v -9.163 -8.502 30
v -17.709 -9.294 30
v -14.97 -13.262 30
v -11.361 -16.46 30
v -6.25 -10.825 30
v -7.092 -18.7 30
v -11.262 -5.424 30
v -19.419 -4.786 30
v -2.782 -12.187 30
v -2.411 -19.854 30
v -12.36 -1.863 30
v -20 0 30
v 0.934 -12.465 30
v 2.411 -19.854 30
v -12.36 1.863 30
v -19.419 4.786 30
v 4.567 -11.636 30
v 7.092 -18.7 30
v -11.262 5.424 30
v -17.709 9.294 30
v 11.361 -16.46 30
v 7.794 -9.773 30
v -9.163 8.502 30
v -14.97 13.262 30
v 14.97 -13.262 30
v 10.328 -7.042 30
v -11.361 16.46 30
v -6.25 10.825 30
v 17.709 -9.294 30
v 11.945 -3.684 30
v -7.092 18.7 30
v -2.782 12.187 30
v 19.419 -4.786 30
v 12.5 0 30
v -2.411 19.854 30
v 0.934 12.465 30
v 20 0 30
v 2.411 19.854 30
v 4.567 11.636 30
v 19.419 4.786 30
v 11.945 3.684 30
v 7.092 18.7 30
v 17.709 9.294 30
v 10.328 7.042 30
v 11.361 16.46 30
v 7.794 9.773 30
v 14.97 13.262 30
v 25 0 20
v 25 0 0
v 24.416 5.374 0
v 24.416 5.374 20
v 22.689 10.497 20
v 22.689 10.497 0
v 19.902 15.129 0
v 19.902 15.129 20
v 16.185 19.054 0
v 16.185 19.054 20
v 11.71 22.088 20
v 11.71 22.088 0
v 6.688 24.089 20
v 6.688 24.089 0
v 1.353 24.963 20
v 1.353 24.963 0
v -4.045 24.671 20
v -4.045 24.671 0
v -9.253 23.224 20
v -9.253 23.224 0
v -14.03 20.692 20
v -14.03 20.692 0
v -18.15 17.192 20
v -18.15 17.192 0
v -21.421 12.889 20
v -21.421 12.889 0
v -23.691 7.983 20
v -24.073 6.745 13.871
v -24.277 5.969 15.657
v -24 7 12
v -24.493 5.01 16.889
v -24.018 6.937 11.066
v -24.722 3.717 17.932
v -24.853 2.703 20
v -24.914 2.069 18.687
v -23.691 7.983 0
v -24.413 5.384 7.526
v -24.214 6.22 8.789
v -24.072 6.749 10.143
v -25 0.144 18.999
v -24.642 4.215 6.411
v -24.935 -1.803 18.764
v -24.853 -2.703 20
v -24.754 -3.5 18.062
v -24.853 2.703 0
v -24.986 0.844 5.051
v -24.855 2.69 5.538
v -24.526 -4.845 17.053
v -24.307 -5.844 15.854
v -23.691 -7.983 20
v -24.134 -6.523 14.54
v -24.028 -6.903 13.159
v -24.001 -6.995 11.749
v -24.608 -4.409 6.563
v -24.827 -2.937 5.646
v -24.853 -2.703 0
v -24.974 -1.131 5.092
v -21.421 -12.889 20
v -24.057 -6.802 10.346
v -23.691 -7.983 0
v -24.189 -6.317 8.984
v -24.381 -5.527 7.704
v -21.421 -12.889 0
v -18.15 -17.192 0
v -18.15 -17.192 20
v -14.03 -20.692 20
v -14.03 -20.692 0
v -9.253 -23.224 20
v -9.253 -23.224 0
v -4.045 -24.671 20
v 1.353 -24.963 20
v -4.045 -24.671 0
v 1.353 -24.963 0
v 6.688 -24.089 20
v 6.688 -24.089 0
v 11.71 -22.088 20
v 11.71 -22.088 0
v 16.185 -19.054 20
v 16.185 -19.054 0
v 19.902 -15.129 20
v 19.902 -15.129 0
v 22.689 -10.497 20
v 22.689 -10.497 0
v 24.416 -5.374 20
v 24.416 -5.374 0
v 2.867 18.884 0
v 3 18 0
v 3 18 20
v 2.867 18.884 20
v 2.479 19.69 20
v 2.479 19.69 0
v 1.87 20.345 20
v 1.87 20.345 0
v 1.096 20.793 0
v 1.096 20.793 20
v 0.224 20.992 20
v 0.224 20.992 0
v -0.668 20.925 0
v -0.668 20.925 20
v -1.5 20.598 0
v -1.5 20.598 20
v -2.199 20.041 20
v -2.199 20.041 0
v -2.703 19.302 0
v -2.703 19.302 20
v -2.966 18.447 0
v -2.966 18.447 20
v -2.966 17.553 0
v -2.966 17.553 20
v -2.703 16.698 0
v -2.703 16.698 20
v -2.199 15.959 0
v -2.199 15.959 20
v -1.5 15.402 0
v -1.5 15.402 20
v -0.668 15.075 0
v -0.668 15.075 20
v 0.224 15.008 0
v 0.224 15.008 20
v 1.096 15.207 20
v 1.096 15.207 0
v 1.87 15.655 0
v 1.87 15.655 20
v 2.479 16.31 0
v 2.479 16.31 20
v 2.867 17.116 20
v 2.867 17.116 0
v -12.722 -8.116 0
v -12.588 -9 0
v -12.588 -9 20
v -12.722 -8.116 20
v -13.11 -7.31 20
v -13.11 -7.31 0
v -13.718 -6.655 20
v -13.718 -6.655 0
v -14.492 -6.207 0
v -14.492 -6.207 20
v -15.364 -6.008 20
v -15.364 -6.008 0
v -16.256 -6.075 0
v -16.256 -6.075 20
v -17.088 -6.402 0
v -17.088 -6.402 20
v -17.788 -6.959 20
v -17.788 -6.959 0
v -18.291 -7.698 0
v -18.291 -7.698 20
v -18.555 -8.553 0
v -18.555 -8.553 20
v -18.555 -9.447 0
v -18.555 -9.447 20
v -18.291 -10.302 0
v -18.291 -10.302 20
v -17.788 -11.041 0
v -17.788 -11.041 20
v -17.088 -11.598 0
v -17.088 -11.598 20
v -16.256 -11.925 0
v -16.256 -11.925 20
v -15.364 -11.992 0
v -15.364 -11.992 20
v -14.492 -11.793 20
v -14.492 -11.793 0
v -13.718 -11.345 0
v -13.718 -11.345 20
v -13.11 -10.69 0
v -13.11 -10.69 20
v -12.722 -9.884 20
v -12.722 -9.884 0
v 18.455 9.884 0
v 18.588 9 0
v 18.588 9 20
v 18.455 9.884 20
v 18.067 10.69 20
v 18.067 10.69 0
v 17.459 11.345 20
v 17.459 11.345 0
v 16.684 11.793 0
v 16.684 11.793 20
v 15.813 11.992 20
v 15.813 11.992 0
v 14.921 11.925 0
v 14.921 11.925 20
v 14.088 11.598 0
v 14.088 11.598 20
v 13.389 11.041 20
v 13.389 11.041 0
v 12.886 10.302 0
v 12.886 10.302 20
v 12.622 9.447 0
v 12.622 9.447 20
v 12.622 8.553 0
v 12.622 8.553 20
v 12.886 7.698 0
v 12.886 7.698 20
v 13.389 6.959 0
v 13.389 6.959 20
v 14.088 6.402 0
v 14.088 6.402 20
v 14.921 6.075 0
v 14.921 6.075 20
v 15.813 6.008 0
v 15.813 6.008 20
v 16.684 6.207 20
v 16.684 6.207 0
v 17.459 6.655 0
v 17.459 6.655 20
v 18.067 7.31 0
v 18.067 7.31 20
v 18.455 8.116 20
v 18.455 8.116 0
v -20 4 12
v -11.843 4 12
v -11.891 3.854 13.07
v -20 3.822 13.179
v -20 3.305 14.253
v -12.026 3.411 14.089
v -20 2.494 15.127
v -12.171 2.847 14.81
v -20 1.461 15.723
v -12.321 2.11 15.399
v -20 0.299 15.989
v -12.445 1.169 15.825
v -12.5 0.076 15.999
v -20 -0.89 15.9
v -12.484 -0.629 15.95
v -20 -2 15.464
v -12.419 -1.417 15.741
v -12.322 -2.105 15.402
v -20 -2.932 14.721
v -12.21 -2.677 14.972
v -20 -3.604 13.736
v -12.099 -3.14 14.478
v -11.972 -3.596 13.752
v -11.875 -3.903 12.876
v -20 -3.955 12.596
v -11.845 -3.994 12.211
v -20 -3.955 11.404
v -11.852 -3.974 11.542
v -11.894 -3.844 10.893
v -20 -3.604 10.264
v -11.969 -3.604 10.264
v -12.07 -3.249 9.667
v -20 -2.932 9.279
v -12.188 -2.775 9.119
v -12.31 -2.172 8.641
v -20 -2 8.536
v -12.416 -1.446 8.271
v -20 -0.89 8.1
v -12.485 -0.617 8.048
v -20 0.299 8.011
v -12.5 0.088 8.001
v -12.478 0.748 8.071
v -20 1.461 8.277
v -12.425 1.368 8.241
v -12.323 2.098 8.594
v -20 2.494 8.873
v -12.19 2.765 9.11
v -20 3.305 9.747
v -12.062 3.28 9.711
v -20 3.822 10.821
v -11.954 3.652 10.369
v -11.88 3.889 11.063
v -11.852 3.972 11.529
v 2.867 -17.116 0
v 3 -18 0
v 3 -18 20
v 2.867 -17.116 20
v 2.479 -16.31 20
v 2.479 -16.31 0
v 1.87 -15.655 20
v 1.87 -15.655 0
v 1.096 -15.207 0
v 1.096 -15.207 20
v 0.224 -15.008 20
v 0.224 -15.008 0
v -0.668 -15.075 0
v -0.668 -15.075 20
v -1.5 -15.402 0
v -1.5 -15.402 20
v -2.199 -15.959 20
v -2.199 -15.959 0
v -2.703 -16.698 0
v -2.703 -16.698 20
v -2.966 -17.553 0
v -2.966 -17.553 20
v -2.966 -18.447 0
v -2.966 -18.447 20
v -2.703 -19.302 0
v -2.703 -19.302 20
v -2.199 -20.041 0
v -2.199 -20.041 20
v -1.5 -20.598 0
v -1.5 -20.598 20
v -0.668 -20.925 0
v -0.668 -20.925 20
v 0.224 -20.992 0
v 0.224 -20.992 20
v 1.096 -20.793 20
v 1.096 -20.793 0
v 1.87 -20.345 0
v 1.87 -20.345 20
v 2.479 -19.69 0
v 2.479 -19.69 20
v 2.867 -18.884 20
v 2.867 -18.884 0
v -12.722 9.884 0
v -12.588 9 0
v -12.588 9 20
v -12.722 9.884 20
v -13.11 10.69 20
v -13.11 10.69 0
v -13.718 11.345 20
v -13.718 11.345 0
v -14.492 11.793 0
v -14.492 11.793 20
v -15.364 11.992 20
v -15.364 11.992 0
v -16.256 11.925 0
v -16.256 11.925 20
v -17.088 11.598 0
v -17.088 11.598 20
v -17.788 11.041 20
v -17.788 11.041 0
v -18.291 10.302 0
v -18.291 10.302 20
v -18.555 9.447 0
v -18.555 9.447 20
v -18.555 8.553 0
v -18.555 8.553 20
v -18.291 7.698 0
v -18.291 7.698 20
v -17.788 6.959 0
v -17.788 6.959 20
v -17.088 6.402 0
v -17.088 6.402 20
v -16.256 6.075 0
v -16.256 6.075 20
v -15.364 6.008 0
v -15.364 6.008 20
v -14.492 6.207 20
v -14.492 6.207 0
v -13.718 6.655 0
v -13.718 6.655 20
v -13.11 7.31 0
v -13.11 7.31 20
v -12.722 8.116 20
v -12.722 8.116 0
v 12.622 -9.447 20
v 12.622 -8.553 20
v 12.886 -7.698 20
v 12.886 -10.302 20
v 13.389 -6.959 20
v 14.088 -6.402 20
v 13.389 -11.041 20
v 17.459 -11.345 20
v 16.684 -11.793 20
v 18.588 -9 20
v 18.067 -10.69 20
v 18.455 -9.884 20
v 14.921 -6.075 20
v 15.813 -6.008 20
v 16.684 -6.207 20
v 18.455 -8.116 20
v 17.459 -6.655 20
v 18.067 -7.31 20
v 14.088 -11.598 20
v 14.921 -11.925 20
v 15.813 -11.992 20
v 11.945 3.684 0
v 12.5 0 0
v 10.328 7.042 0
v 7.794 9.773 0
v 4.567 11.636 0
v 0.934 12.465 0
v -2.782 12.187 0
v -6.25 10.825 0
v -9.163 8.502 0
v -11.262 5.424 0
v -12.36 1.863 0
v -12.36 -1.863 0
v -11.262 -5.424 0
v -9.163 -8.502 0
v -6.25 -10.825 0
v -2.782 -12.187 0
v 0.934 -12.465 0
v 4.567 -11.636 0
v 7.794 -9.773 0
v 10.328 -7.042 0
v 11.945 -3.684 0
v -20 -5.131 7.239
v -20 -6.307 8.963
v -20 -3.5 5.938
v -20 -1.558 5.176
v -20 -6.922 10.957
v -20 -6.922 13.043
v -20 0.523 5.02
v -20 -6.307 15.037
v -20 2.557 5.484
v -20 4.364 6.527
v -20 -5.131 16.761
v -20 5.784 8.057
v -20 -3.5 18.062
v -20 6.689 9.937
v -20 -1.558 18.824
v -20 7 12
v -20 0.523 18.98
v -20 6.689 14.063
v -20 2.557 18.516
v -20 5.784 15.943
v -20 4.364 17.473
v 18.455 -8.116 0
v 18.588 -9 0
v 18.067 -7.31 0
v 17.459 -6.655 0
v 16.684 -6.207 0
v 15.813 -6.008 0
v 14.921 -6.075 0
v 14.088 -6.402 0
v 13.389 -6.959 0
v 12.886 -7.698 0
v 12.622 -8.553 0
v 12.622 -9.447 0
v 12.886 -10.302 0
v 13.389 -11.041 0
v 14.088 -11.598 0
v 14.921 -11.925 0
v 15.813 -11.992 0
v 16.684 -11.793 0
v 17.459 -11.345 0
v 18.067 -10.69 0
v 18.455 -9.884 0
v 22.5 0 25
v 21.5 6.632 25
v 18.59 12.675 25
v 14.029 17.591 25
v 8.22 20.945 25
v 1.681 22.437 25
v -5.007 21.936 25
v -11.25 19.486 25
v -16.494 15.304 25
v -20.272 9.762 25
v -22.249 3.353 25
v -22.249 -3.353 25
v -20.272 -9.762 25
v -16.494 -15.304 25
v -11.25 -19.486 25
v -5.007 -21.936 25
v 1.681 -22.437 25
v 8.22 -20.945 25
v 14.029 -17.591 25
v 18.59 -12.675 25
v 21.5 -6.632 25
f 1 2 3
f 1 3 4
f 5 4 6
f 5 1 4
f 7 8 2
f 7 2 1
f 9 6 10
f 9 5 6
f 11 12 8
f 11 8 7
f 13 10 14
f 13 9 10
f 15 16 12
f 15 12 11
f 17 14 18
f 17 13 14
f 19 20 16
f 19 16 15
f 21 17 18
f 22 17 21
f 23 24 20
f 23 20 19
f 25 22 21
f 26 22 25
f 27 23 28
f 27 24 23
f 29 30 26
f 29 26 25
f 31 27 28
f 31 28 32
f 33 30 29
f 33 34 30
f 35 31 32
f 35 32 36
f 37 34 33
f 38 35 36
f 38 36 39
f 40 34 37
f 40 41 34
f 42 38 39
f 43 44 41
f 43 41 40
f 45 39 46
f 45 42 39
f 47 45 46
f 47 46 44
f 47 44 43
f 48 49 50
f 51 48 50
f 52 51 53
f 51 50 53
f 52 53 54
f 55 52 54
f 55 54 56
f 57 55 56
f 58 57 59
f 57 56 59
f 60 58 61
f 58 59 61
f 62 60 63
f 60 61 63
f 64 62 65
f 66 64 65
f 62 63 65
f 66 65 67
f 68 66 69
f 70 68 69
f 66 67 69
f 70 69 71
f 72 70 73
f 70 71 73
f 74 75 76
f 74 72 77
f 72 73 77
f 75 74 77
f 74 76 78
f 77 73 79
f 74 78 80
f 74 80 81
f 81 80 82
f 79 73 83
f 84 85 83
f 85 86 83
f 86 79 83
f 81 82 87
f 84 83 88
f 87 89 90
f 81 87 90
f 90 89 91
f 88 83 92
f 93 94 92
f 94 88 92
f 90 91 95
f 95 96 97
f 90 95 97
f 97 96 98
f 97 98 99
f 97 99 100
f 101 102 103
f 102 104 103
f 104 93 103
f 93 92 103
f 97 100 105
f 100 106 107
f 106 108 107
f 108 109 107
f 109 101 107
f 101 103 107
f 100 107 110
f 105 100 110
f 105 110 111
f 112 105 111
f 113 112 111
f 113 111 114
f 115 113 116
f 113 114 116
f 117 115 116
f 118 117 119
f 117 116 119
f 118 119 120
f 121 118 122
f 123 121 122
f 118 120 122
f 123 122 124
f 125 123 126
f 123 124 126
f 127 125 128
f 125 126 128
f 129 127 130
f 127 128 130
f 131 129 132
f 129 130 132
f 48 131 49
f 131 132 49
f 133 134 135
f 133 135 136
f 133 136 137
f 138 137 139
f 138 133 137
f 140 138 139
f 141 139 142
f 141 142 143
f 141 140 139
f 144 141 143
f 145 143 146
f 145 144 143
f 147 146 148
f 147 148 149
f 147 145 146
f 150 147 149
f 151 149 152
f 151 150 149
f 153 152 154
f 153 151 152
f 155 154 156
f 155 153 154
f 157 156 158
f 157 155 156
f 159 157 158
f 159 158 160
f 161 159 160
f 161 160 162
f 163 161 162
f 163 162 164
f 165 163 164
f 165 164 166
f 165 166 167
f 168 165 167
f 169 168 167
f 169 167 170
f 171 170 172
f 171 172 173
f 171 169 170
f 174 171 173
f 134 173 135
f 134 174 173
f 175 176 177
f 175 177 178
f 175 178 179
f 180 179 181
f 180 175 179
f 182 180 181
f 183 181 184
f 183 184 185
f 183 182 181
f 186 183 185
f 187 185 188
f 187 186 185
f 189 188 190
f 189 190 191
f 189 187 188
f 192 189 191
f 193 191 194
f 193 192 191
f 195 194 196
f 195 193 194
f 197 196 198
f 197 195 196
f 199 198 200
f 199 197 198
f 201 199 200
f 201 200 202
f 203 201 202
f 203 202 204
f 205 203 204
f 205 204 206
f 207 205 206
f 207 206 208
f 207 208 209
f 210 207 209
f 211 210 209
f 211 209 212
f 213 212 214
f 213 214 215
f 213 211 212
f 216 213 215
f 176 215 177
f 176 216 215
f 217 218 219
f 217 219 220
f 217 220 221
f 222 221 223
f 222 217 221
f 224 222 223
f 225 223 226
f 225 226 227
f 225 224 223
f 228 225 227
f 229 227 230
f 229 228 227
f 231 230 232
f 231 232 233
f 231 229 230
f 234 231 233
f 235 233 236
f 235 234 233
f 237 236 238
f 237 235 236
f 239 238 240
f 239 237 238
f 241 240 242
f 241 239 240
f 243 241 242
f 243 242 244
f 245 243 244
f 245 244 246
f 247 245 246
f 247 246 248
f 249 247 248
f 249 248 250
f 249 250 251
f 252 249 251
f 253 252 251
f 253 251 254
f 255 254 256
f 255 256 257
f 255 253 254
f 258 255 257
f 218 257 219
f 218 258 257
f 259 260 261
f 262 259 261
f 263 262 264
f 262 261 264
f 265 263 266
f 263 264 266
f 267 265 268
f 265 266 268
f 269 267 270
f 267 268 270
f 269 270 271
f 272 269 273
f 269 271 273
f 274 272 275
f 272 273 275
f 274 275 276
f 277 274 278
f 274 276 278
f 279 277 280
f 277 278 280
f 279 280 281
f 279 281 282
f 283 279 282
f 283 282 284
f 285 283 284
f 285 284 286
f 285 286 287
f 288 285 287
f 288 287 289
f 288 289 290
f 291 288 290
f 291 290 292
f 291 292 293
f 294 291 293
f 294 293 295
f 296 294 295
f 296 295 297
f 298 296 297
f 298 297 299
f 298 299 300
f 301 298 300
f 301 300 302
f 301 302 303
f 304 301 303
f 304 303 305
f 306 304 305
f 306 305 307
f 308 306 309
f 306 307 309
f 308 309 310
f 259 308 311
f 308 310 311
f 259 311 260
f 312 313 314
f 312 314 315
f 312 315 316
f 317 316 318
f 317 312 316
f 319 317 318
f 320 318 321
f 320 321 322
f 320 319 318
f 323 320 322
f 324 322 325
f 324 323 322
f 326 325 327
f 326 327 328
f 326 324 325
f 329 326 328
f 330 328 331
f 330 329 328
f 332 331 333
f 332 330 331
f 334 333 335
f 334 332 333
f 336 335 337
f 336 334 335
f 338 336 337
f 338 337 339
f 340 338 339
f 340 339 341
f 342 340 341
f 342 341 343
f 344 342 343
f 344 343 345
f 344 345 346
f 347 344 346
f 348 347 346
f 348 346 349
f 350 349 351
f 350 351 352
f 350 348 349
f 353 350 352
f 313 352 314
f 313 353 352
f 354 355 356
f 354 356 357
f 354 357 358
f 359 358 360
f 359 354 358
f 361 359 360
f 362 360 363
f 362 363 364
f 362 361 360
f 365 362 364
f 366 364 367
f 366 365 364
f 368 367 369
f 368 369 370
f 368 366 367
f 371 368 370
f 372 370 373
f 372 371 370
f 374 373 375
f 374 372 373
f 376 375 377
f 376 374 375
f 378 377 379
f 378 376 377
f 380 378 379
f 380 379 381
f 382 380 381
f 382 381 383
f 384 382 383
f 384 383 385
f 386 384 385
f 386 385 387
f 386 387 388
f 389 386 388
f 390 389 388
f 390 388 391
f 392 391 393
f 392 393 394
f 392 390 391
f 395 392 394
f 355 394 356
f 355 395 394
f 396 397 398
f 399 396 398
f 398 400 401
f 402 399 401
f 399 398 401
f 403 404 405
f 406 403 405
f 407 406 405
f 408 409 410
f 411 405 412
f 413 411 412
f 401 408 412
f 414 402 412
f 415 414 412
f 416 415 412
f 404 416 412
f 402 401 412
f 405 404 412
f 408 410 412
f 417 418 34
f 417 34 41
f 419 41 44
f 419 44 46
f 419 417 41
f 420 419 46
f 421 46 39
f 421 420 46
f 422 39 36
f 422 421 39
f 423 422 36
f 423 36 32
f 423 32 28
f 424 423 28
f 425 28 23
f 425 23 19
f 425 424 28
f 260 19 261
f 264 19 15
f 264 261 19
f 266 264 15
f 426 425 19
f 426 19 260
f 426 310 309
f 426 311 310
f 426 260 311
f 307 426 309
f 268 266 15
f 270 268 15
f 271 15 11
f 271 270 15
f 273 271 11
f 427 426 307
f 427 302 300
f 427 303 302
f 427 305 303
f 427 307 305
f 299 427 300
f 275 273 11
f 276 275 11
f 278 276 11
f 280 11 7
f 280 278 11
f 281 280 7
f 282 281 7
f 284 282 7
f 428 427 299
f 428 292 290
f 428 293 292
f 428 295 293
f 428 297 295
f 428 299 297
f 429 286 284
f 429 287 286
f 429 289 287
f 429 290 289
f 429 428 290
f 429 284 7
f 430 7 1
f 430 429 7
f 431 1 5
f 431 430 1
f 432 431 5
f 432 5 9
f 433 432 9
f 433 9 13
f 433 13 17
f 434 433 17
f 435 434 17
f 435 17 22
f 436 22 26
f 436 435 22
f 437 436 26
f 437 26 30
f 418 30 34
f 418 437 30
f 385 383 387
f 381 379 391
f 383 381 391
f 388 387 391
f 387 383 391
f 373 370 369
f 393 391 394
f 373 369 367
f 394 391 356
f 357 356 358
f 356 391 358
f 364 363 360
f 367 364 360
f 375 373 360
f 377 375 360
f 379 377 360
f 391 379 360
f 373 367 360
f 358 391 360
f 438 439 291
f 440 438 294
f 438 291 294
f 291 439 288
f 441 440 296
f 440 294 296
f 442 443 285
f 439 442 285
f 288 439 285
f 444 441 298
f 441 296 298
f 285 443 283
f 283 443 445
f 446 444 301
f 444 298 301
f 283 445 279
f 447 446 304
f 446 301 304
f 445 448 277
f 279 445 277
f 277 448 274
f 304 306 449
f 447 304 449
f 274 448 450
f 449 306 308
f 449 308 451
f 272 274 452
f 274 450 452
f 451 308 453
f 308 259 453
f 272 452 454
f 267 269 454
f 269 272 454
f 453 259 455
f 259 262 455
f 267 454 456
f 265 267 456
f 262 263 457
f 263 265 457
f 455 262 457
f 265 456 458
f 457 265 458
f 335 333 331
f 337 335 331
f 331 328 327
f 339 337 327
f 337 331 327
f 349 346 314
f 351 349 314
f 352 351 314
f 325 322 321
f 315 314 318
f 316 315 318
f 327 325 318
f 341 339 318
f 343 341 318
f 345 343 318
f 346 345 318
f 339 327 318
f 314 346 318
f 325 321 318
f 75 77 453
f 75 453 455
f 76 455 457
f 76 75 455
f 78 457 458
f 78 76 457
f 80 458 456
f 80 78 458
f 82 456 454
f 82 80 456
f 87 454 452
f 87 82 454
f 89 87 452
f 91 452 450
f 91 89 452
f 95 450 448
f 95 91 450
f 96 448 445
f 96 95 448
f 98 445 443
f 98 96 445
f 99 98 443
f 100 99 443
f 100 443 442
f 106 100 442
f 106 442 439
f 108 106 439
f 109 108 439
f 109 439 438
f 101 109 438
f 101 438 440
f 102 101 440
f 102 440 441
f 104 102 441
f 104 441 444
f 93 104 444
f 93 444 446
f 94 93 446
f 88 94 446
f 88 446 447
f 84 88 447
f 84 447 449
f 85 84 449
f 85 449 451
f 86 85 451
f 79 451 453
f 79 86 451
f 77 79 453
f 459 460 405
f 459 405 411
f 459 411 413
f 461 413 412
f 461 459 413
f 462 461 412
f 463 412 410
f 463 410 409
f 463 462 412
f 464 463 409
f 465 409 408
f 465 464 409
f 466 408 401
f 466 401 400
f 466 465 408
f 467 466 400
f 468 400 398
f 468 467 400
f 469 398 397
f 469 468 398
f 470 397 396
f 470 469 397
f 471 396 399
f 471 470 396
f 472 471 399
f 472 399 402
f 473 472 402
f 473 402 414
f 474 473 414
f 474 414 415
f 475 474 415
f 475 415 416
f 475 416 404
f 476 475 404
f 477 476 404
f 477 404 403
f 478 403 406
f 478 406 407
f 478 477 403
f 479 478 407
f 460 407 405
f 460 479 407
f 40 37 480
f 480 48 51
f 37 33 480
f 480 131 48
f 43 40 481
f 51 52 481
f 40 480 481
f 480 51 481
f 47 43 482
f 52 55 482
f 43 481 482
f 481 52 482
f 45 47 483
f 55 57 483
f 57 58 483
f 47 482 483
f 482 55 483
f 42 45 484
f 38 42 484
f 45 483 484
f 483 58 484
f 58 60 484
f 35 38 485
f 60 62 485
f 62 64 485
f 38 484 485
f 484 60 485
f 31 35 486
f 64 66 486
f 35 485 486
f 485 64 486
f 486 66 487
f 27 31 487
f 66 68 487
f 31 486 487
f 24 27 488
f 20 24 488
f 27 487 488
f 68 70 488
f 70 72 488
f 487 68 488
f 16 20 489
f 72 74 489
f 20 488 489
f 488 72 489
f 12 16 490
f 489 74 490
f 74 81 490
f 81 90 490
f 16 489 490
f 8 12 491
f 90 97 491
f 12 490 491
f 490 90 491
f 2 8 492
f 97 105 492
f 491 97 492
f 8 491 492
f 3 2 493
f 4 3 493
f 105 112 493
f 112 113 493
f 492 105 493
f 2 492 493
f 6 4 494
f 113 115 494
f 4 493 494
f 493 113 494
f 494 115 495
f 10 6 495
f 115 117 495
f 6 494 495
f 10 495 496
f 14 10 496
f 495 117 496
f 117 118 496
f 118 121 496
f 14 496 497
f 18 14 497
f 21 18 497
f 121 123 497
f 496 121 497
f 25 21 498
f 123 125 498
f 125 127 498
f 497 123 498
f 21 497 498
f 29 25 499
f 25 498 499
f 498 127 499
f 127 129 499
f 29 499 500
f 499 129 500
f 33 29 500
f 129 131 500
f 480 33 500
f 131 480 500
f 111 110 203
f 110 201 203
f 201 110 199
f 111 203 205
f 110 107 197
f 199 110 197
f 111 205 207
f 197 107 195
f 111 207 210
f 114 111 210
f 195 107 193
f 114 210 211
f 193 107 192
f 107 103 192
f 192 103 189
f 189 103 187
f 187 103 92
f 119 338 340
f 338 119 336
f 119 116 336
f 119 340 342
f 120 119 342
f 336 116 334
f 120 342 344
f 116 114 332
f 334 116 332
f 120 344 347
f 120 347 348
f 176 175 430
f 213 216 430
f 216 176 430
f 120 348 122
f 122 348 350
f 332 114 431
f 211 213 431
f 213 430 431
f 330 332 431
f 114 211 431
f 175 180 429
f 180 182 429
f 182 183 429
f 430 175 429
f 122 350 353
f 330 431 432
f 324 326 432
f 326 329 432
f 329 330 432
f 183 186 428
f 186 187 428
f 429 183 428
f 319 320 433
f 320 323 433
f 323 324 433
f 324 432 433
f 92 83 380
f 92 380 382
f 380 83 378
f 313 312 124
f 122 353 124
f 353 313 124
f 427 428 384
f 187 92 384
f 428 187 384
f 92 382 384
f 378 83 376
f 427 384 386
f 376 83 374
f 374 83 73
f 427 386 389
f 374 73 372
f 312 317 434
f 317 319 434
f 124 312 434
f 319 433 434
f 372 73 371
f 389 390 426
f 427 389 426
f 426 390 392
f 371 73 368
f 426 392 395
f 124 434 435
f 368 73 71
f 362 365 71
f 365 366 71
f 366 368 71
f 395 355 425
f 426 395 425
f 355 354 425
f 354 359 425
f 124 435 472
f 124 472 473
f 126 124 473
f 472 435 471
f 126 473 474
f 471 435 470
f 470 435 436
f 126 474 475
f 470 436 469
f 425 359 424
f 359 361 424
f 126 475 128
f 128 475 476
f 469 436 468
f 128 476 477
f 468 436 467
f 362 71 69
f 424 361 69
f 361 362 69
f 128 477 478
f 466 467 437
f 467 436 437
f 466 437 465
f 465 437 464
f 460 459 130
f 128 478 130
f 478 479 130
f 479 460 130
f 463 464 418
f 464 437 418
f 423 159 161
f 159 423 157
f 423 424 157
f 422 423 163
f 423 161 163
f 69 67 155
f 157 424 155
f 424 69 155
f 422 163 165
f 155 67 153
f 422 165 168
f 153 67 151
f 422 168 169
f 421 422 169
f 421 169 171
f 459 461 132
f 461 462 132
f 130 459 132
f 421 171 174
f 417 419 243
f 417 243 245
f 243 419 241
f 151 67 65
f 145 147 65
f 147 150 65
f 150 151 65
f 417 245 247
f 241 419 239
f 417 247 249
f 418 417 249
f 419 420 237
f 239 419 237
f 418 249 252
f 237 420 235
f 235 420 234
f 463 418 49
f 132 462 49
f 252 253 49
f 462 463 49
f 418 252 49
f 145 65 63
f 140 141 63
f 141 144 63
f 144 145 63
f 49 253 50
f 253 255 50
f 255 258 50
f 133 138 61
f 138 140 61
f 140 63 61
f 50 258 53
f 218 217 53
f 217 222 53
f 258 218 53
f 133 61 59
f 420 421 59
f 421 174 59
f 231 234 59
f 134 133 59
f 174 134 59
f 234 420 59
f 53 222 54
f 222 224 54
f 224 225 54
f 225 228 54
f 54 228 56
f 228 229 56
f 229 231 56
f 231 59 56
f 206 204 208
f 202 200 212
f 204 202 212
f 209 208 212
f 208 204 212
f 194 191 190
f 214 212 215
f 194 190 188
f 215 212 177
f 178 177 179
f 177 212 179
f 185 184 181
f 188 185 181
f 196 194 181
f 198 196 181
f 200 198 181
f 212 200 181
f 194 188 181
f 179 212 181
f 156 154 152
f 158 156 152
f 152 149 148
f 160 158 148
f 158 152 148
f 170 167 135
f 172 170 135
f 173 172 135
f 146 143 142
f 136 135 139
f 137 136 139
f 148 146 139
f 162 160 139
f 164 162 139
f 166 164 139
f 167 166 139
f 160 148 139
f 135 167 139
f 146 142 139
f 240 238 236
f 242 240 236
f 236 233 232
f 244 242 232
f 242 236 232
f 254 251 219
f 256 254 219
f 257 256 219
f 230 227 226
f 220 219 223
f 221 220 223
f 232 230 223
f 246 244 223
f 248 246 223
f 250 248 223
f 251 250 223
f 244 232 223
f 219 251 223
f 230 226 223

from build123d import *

# Parameters (mm, degrees)
F0_R      = 25
F0_R_2    = 3
F0_R_3    = 12.5
F1_DEPTH  = 20
F2_R      = 25
F2_R_2    = 12.5
F3_DEPTH  = 10
F4_SIZE2  = 10
F4_SIZE   = 5
F5_R      = 4
F6_DEPTH  = 26.0000001
F8_R      = 7
F9_DEPTH  = 5
F10_DEPTH = 20


with BuildPart() as f1:
    # F0 (on Top) → F1 (new body)
    with BuildSketch(Plane.XY):
        Circle(F0_R)
        with Locations((-15.5884572681, -9)):
            Circle(F0_R_2, mode=Mode.SUBTRACT)
        with Locations((0, -18)):
            Circle(F0_R_2, mode=Mode.SUBTRACT)
        with Locations((15.5884572681, -9)):
            Circle(F0_R_2, mode=Mode.SUBTRACT)
        with Locations((-15.5884572681, 9)):
            Circle(F0_R_2, mode=Mode.SUBTRACT)
        Circle(F0_R_3, mode=Mode.SUBTRACT)
        with Locations((15.5884572681, 9)):
            Circle(F0_R_2, mode=Mode.SUBTRACT)
        with Locations((0, 18)):
            Circle(F0_R_2, mode=Mode.SUBTRACT)
        with Locations((0, -18)):
            Circle(F0_R_2)
        with Locations((-15.5884572681, -9)):
            Circle(F0_R_2)
        with Locations((15.5884572681, -9)):
            Circle(F0_R_2)
        with Locations((15.5884572681, 9)):
            Circle(F0_R_2)
        with Locations((0, 18)):
            Circle(F0_R_2)
        with Locations((-15.5884572681, 9)):
            Circle(F0_R_2)
    extrude(amount=F1_DEPTH)

    # F2 (on face) → F3 (join)
    with BuildSketch(Plane.XY.offset(20)):
        Circle(F2_R)
        Circle(F2_R_2, mode=Mode.SUBTRACT)
    extrude(amount=F3_DEPTH)

    # F4
    f4_edges = [f1.edges().sort_by_distance(p)[0] for p in [
        (-25, 0, 30),
    ]]
    f4_side = f1.faces().sort_by_distance((-24.292893, 0, 30))[0]
    chamfer(f4_edges, length=F4_SIZE, length2=F4_SIZE2, reference=f4_side)

    # F5 (on Right) → F6 (cut, up to face)
    with BuildSketch(Plane.YZ):
        with Locations((0, 12)):
            Circle(F5_R)
    extrude(amount=-F6_DEPTH, mode=Mode.SUBTRACT)

    # F8 (on offset) → F9 (cut)
    with BuildSketch(Plane.YZ.offset(-25)):
        with Locations((0, 12)):
            Circle(F8_R)
    extrude(amount=F9_DEPTH, mode=Mode.SUBTRACT)

    # F0 (on Top) → F10 (cut)
    with BuildSketch(Plane.XY):
        with Locations((0, -18)):
            Circle(F0_R_2)
        with Locations((15.5884572681, -9)):
            Circle(F0_R_2)
        with Locations((15.5884572681, 9)):
            Circle(F0_R_2)
        with Locations((0, 18)):
            Circle(F0_R_2)
        with Locations((-15.5884572681, 9)):
            Circle(F0_R_2)
        with Locations((-15.5884572681, -9)):
            Circle(F0_R_2)
    extrude(amount=F10_DEPTH, mode=Mode.SUBTRACT)


solid = f1.part
